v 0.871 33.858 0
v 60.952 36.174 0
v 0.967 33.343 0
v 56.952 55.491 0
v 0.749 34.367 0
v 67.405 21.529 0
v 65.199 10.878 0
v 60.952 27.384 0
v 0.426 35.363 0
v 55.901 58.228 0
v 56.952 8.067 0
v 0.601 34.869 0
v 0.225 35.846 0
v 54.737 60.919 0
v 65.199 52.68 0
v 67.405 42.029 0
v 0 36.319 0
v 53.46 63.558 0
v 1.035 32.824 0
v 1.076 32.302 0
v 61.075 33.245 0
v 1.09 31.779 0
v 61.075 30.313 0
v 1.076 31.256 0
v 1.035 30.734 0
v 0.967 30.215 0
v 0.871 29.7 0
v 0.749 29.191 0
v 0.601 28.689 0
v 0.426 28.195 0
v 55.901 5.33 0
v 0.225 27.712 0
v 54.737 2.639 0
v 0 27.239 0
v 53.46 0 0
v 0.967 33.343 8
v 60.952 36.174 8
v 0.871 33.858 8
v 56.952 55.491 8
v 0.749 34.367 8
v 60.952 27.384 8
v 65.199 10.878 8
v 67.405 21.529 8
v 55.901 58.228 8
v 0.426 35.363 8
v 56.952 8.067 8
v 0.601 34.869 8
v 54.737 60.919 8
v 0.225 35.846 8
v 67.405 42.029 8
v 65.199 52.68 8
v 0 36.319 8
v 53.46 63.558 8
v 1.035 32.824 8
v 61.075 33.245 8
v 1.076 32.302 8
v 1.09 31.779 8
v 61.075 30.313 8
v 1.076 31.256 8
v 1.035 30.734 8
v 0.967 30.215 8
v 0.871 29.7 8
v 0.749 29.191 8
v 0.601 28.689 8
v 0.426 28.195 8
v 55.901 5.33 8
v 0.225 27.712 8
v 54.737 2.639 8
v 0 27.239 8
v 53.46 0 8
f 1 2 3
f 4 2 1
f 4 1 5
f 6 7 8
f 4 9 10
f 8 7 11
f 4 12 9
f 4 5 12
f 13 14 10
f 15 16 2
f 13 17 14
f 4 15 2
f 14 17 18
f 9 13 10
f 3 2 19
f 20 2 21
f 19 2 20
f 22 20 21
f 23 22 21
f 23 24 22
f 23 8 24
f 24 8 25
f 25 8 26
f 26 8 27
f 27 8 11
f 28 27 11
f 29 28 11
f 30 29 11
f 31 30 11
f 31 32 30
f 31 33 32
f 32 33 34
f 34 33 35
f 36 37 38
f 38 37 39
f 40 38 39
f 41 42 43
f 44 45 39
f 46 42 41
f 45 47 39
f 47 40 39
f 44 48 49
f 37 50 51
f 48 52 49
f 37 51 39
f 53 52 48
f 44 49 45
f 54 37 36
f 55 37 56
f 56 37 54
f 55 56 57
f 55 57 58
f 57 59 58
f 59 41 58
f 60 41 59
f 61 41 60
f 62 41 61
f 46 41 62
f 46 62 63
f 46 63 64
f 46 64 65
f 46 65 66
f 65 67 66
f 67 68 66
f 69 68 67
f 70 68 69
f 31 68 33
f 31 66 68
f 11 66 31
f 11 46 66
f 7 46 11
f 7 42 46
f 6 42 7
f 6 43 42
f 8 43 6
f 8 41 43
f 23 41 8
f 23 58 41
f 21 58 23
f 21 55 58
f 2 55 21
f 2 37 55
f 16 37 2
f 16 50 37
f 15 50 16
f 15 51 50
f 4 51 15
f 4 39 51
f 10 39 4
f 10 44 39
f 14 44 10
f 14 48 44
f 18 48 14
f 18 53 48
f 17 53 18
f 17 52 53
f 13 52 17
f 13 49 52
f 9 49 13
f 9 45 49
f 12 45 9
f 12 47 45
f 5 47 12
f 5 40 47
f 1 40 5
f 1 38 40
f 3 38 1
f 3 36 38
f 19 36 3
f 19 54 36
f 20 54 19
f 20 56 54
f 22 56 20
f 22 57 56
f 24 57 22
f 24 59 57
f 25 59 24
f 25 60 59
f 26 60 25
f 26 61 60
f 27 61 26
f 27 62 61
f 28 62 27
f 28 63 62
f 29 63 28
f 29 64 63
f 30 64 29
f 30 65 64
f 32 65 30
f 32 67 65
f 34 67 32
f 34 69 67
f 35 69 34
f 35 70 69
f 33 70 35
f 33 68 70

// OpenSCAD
$fn = 32;

// ----------------------------------------------------------------------
// Gear sector: 2 teeth on 54 degrees
// ----------------------------------------------------------------------

// --- parameters (mm) ---
sector_angle = 54;        // sector angle, degrees
root_r = 70;              // root circle radius
tooth_h = 7;              // tooth height over the root circle
teeth = 2;                // number of teeth on the sector
hub_r = 10;               // hub bore radius
plate_t = 8;              // sector thickness, Z
arc_step = 3;             // sampling step of the root/hub arcs, degrees

tip_r = root_r + tooth_h;  // tip circle radius

profile = [[53.46, 0], [54.737, 2.639], [55.901, 5.33], [56.952, 8.067], [65.199, 10.878], [67.405, 21.529], [60.952, 27.384], [61.075, 30.313], [61.075, 33.245], [60.952, 36.174], [67.405, 42.029], [65.199, 52.68], [56.952, 55.491], [55.901, 58.228], [54.737, 60.919], [53.46, 63.558], [0, 36.319], [0.225, 35.846], [0.426, 35.363], [0.601, 34.869], [0.749, 34.367], [0.871, 33.858], [0.967, 33.343], [1.035, 32.824], [1.076, 32.302], [1.09, 31.779], [1.076, 31.256], [1.035, 30.734], [0.967, 30.215], [0.871, 29.7], [0.749, 29.191], [0.601, 28.689], [0.426, 28.195], [0.225, 27.712], [0, 27.239]];  // primary outline, 35 points, counter clockwise

// --- the one profile operation ---
linear_extrude(height = plate_t) polygon(points = profile);
